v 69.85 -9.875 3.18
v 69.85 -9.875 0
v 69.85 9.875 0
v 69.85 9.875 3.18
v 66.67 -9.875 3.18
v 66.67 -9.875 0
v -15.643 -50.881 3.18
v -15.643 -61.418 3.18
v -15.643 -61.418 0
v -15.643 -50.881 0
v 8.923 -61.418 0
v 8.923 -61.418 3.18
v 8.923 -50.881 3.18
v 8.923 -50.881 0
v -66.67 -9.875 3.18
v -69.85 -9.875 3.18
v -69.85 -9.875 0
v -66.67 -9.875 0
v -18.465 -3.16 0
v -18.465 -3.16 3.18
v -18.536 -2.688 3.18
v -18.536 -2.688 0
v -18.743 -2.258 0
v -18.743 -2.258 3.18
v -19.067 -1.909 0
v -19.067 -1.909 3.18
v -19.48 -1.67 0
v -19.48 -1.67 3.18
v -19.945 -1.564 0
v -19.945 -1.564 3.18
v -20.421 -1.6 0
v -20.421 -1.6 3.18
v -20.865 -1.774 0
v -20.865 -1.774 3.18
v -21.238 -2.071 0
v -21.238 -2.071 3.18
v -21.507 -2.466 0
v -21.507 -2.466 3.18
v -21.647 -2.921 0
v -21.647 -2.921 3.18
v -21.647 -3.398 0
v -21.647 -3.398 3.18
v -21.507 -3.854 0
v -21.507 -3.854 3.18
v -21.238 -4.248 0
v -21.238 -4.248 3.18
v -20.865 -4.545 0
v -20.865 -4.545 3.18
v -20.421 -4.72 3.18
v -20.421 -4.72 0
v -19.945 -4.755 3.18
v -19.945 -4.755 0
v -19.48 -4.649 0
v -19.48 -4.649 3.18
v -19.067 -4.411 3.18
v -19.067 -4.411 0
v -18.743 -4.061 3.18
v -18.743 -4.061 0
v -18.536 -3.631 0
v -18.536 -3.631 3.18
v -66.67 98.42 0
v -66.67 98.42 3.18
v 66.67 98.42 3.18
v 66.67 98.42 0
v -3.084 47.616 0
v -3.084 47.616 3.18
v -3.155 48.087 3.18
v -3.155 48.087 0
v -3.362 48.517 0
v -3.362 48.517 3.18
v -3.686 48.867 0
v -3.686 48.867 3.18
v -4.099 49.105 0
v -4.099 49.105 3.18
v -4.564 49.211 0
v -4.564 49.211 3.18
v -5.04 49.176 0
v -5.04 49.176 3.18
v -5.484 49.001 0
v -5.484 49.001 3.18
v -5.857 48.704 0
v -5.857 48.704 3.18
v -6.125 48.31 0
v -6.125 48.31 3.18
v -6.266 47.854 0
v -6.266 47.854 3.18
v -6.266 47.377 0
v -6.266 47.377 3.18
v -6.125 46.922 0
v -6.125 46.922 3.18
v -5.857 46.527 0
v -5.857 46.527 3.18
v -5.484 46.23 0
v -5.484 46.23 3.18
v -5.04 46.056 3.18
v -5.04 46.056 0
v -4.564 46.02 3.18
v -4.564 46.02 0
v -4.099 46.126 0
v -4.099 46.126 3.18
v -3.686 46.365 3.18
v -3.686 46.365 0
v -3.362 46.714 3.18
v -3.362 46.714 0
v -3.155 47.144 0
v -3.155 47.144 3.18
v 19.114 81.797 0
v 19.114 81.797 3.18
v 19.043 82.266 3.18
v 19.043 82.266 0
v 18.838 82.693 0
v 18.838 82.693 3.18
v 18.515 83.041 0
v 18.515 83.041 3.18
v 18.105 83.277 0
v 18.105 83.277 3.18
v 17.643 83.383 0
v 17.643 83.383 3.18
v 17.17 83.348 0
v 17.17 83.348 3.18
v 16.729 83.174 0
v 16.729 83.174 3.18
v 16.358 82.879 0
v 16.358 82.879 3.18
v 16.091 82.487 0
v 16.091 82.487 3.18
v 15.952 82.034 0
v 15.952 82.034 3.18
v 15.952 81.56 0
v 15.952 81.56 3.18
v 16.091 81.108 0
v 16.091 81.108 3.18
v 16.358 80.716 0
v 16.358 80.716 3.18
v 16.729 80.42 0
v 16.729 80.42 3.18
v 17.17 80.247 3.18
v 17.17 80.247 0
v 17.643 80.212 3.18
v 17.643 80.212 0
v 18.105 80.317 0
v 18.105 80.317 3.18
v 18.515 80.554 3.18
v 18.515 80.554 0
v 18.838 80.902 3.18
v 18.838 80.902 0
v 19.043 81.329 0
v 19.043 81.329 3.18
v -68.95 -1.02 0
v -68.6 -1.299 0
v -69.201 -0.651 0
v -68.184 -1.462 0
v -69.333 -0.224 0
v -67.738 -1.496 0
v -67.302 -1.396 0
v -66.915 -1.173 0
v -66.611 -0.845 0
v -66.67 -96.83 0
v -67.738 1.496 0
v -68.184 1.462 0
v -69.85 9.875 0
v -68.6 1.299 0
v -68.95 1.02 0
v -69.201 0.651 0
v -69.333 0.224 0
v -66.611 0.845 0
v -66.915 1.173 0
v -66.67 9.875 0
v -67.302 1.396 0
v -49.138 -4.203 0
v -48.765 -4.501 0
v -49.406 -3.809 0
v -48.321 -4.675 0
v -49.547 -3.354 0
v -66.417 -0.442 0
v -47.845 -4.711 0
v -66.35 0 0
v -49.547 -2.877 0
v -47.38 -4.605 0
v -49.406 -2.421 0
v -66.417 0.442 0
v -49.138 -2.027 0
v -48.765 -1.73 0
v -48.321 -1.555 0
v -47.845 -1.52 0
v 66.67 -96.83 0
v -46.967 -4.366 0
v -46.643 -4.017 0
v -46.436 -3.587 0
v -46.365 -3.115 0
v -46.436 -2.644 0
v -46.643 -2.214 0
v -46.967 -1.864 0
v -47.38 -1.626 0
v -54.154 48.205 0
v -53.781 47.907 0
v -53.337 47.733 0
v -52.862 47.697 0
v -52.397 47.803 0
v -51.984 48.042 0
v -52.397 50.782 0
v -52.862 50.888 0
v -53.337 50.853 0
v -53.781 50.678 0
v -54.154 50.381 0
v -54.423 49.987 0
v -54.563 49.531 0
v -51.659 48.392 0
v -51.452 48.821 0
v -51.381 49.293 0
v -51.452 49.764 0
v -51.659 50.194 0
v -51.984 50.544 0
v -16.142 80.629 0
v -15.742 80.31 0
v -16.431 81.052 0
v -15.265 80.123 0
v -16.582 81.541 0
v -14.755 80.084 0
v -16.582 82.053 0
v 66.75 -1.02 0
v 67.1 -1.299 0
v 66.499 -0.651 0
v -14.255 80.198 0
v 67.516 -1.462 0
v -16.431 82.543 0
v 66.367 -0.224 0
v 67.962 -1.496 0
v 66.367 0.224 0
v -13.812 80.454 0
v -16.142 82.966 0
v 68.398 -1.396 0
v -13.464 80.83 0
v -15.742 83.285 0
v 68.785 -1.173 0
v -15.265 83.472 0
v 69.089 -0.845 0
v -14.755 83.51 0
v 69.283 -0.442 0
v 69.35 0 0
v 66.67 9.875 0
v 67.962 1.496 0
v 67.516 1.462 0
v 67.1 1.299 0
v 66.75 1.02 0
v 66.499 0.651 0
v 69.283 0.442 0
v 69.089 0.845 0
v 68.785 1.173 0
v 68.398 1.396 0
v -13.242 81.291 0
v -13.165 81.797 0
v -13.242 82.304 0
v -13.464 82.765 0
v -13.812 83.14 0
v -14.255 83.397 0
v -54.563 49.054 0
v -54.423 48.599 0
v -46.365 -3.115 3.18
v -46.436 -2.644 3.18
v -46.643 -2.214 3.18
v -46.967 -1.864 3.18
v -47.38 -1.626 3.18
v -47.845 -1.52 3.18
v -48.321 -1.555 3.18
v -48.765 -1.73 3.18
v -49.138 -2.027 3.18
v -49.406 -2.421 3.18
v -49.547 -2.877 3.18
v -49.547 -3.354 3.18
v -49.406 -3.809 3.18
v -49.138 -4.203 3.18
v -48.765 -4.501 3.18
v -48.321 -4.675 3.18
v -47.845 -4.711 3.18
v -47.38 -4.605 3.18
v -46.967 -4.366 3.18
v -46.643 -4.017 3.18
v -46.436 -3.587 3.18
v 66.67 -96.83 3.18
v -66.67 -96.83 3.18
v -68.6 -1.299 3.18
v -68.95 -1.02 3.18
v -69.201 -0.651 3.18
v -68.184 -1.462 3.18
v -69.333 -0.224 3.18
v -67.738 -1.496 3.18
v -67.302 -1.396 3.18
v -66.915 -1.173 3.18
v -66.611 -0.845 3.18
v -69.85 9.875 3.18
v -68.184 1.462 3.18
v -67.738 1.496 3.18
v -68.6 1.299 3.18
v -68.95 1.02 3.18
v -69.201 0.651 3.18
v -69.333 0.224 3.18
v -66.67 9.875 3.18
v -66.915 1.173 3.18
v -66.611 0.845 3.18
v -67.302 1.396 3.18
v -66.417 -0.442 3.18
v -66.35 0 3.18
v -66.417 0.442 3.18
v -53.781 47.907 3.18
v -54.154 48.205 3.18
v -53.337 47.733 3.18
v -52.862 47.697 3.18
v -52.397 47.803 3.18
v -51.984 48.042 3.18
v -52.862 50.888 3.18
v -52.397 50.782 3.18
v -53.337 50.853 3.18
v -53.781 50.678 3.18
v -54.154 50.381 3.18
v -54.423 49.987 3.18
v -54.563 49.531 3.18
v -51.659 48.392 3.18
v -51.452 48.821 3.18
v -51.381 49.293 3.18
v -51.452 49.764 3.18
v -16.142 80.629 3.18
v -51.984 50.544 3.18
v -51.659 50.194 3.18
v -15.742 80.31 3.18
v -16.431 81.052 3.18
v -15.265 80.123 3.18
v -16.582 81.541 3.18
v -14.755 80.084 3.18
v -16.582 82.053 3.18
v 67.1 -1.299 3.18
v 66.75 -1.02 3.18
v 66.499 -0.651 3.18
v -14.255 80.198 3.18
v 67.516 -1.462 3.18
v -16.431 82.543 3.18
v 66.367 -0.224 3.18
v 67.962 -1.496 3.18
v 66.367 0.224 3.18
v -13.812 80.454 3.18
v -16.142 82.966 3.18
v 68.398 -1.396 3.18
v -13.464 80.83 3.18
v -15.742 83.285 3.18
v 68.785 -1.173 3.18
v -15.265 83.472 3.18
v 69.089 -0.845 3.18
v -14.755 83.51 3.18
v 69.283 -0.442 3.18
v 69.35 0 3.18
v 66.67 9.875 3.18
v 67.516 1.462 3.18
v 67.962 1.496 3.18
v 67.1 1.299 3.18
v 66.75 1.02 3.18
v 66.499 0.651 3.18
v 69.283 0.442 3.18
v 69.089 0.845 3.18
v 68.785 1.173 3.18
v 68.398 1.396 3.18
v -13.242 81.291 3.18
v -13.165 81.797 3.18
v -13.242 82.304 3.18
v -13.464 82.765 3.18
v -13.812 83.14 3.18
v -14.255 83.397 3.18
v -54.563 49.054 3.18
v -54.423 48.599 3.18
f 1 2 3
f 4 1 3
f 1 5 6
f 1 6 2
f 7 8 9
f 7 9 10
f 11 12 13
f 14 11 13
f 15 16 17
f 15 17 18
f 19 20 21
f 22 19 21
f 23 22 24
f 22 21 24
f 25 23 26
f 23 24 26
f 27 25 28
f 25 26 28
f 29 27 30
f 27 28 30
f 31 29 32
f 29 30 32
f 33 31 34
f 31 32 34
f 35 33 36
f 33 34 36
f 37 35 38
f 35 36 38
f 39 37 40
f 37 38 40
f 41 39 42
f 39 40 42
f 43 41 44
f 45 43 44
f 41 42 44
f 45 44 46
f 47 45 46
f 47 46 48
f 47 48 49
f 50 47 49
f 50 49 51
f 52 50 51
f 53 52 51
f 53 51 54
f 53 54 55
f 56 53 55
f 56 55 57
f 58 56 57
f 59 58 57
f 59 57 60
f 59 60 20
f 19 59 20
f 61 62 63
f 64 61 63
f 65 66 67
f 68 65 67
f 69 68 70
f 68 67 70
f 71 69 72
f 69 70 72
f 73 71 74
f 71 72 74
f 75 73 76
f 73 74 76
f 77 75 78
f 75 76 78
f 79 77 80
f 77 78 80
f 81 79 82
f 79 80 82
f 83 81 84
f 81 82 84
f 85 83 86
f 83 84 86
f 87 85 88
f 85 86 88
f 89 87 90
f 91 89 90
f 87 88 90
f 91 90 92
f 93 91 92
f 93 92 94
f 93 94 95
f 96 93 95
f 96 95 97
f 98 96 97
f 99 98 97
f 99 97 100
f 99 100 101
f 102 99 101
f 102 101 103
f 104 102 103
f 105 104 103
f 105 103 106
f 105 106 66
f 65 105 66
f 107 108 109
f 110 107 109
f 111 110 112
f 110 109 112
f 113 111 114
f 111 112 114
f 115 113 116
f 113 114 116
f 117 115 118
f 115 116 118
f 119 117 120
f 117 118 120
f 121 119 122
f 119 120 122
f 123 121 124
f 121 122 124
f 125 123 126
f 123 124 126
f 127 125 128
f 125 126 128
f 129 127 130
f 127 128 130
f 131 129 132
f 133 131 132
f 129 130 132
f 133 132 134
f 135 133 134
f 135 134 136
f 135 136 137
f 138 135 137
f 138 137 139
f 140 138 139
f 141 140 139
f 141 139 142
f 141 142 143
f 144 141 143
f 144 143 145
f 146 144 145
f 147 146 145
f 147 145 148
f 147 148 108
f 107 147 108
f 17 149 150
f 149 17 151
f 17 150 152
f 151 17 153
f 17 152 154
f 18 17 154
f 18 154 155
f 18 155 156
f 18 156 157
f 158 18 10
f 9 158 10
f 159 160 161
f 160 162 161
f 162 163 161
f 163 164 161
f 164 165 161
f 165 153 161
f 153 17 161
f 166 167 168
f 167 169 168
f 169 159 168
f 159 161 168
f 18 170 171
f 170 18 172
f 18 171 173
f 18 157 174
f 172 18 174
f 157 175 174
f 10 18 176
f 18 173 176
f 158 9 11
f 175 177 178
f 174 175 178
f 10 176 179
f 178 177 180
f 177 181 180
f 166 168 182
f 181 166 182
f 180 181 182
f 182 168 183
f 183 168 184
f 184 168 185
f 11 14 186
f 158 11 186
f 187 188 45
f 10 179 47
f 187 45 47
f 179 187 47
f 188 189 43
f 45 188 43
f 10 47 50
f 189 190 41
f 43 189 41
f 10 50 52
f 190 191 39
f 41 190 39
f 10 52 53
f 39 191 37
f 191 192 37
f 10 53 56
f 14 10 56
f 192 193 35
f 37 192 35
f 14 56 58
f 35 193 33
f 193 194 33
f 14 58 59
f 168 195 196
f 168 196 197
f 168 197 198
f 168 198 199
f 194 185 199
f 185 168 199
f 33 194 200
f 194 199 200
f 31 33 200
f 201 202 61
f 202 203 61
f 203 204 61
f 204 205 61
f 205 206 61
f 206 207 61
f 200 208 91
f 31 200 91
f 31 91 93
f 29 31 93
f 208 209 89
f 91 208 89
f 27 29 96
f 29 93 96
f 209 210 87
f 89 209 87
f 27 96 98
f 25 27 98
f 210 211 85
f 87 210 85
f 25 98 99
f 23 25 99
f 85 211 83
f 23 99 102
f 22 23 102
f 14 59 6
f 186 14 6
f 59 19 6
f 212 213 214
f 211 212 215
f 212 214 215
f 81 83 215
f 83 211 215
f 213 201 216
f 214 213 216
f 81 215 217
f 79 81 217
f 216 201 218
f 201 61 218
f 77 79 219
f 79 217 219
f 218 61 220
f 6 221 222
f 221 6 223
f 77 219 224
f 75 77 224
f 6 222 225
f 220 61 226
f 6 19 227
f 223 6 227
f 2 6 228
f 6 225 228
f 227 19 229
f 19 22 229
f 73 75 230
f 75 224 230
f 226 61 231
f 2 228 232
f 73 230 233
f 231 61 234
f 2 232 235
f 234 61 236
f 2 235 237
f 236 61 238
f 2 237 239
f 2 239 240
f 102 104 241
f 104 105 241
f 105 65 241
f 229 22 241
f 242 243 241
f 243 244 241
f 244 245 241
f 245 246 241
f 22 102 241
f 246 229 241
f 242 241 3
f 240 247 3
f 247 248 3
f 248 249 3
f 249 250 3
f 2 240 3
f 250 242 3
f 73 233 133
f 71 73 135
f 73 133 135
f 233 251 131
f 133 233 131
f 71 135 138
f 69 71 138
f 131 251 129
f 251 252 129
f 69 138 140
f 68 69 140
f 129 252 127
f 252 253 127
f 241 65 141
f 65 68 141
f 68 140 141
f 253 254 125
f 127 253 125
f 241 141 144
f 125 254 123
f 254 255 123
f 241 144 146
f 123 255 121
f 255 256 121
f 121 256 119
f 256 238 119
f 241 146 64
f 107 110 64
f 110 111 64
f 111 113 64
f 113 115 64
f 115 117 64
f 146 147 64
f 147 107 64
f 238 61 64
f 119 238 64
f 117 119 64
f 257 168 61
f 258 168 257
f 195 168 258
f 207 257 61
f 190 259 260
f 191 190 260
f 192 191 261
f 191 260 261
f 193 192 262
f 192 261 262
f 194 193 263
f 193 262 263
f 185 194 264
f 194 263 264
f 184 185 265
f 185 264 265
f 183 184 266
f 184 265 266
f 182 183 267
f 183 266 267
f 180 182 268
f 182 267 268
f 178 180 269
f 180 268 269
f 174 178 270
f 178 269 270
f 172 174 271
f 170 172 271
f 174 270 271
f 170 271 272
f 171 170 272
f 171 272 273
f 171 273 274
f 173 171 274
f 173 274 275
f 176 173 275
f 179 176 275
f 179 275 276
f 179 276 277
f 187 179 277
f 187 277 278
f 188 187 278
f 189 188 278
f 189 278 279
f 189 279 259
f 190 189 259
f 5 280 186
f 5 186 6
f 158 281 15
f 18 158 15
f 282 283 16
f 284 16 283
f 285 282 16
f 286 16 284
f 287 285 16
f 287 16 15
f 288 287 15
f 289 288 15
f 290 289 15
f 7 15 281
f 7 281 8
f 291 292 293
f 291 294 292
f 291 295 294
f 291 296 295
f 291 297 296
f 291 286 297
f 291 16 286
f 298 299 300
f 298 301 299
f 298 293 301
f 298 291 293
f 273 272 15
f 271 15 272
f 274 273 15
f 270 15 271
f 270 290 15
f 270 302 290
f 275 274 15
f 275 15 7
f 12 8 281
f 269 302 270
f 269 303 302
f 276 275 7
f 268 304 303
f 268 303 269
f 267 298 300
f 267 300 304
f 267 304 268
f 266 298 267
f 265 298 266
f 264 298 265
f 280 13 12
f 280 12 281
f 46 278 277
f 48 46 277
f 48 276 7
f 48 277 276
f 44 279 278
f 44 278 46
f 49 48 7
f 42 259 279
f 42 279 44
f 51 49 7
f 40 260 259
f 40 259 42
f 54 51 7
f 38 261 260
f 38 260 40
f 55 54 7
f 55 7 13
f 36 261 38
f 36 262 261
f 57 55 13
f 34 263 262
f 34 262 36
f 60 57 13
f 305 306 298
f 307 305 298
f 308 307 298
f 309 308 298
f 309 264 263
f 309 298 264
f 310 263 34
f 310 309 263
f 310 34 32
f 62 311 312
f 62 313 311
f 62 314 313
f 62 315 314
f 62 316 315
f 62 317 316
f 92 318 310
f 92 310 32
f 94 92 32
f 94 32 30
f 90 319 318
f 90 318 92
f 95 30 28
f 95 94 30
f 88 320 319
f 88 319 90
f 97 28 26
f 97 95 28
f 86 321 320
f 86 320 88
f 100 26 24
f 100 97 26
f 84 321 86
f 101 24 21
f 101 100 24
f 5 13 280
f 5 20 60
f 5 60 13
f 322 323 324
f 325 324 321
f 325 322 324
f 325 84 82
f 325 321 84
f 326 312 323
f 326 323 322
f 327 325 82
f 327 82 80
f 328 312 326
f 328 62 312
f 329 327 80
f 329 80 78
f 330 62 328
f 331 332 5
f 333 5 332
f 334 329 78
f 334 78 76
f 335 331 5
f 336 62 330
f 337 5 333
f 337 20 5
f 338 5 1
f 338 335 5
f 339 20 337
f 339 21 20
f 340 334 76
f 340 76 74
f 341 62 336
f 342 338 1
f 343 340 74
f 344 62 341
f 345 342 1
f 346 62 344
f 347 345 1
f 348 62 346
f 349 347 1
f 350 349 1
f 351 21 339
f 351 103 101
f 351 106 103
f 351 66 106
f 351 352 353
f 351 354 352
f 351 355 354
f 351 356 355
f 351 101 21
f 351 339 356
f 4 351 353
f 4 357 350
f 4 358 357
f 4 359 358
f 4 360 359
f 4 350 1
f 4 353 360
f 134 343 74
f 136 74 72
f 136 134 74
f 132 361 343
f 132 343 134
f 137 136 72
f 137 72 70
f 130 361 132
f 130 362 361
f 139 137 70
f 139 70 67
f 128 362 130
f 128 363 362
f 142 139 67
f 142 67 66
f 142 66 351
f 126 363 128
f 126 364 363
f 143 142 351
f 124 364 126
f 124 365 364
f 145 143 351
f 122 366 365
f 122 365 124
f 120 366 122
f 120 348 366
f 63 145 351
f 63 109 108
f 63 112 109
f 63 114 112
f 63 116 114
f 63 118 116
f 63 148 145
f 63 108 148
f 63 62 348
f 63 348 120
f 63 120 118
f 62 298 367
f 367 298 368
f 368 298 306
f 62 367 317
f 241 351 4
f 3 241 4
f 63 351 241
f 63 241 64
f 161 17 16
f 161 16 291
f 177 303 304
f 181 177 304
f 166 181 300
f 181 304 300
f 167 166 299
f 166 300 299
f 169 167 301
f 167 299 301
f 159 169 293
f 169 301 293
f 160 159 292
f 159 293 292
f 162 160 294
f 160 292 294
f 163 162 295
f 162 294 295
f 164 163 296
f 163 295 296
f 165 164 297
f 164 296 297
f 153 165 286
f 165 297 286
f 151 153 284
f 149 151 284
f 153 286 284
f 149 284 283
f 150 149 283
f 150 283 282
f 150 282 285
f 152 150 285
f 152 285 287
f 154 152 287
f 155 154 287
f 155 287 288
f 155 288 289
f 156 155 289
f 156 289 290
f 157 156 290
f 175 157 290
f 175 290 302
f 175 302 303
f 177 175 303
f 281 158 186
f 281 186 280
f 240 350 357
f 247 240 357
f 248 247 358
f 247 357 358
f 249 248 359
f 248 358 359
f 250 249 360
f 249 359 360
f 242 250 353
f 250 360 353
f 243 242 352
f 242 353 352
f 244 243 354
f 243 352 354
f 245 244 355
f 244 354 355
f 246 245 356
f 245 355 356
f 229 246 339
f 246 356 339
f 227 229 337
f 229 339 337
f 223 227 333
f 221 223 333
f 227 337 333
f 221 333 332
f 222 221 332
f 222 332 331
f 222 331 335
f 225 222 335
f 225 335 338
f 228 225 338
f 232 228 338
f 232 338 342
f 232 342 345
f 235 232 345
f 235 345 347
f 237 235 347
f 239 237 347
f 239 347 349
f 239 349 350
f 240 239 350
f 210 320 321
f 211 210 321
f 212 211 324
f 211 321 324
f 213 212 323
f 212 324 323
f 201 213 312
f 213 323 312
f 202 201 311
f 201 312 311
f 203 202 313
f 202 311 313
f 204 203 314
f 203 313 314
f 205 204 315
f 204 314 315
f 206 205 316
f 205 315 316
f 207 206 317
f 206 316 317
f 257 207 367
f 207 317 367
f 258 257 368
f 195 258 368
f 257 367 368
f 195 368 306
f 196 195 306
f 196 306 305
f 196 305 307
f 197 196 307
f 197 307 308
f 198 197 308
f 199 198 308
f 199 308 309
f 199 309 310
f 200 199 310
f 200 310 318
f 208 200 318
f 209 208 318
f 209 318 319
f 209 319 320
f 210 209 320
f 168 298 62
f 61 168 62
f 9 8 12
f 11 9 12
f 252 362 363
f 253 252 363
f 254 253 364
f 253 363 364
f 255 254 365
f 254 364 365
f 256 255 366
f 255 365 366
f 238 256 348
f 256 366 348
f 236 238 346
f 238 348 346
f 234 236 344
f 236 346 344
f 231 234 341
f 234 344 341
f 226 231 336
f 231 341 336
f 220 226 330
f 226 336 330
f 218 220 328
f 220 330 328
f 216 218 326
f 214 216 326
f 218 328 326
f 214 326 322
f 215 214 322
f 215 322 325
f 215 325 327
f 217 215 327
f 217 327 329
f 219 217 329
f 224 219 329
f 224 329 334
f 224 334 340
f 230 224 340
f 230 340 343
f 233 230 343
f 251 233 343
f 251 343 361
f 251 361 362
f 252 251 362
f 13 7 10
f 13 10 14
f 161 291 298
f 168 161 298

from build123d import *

# Parameters (mm, degrees)
SKETCH1_W           = 139.7
SKETCH1_H           = 200.02
BOSS_EXTRUDE1_DEPTH = 3.18
SKETCH2_R           = 1.5
SKETCH2_W           = 3.18
SKETCH2_H           = 90.135
CUT_EXTRUDE1_DEPTH  = 4.18
SKETCH5_W           = 88.895716174
SKETCH5_H           = 168.56277979
BOSS_EXTRUDE2_DEPTH = 3.18
SKETCH6_W           = 20
SKETCH6_H           = 200.02
BOSS_EXTRUDE3_DEPTH = 3.18
SKETCH7_W           = 56.795
SKETCH7_H           = 3.18
CUT_EXTRUDE4_DEPTH  = 4.18
SKETCH8_W           = 133.34
SKETCH8_H           = 1.59
CUT_EXTRUDE5_DEPTH  = 4.18
SKETCH9_R           = 1.6
CUT_EXTRUDE6_DEPTH  = 4.18
SKETCH10_W          = 24.565797096
SKETCH10_H          = 10.537213664
CUT_EXTRUDE7_DEPTH  = 3.18
SKETCH11_R          = 1.59
SKETCH11_R_2        = 1.71788268
CUT_EXTRUDE8_DEPTH  = 35
SKETCH12_W          = 3.18
SKETCH12_H          = 3.18
CUT_EXTRUDE9_DEPTH  = 80.725


with BuildPart() as part:
    # Sketch1 → Boss-Extrude1 (new body)
    with BuildSketch(Plane.XY):
        Rectangle(SKETCH1_W, SKETCH1_H)
    extrude(amount=BOSS_EXTRUDE1_DEPTH)

    # Sketch2 → Cut-Extrude1 (cut, through all)
    with BuildSketch(Plane.XY.offset(3.18)):
        with Locations((-67.85, 0)):
            Circle(SKETCH2_R)
        with Locations((67.85, 0)):
            Circle(SKETCH2_R)
        Polygon((-10, 100.01), (10, 100.01), (10, 96.83), (1.5, 96.83), (1.5, 92.83), (3.5, 92.83), (3.5, 89.83), (1.5, 89.83), (1.5, 86.83), (-1.5, 86.83), (-1.5, 89.83), (-3.5, 89.83), (-3.5, 92.83), (-1.5, 92.83), (-1.5, 96.83), (-10, 96.83), align=None)
        Polygon((-10, -100.01), (-10, -96.83), (-1.5, -96.83), (-1.5, -92.83), (-3.5, -92.83), (-3.5, -89.83), (-1.5, -89.83), (-1.5, -86.83), (1.5, -86.83), (1.5, -89.83), (3.5, -89.83), (3.5, -92.83), (1.5, -92.83), (1.5, -96.83), (10, -96.83), (10, -100.01), align=None)
        with Locations((-68.26, 54.9425)):
            Rectangle(SKETCH2_W, SKETCH2_H)
        with Locations((-68.26, -54.9425)):
            Rectangle(SKETCH2_W, SKETCH2_H)
        with Locations((68.26, -54.9425)):
            Rectangle(SKETCH2_W, SKETCH2_H)
        with Locations((68.26, 54.9425)):
            Rectangle(SKETCH2_W, SKETCH2_H)
    extrude(amount=-CUT_EXTRUDE1_DEPTH, mode=Mode.SUBTRACT)

    # Sketch5 → Boss-Extrude2 (add)
    with BuildSketch(Plane.XY.offset(3.18)):
        Rectangle(SKETCH5_W, SKETCH5_H)
    extrude(amount=-BOSS_EXTRUDE2_DEPTH)

    # Sketch6 → Boss-Extrude3 (add)
    with BuildSketch(Plane.XY.offset(3.18)):
        Rectangle(SKETCH6_W, SKETCH6_H)
    extrude(amount=-BOSS_EXTRUDE3_DEPTH)

    # Sketch7 → Cut-Extrude4 (cut, through all)
    with BuildSketch(Plane.XY.offset(3.18)):
        with Locations((-38.2725, -98.42)):
            Rectangle(SKETCH7_W, SKETCH7_H)
        with Locations((38.2725, -98.42)):
            Rectangle(SKETCH7_W, SKETCH7_H)
    extrude(amount=-CUT_EXTRUDE4_DEPTH, mode=Mode.SUBTRACT)

    # Sketch8 → Cut-Extrude5 (cut, through all)
    with BuildSketch(Plane.XY.offset(3.18)):
        with Locations((0, 99.215)):
            Rectangle(SKETCH8_W, SKETCH8_H)
    extrude(amount=-CUT_EXTRUDE5_DEPTH, mode=Mode.SUBTRACT)

    # Sketch9 → Cut-Extrude6 (cut, through all)
    with BuildSketch(Plane.XY.offset(3.18)):
        with Locations((-52.981261278, 49.292856132)):
            Circle(SKETCH9_R)
        with Locations((-4.68387739, 47.615742656)):
            Circle(SKETCH9_R)
        with Locations((-20.064964891, -3.1597647)):
            Circle(SKETCH9_R)
        with Locations((-47.964929331, -3.115219713)):
            Circle(SKETCH9_R)
    extrude(amount=-CUT_EXTRUDE6_DEPTH, mode=Mode.SUBTRACT)

    # Sketch10 → Cut-Extrude7 (cut)
    with BuildSketch(Plane.XY.offset(3.18)):
        with Locations((-3.359789788, -56.149532718)):
            Rectangle(SKETCH10_W, SKETCH10_H)
    extrude(amount=-CUT_EXTRUDE7_DEPTH, mode=Mode.SUBTRACT)

    # Sketch11 → Cut-Extrude8 (cut)
    with BuildSketch(Plane.XY.offset(3.18)):
        with Locations((17.523878239, 81.797398404)):
            Circle(SKETCH11_R)
        with Locations((-14.883091948, 81.797398404)):
            Circle(SKETCH11_R_2)
    extrude(amount=-CUT_EXTRUDE8_DEPTH, mode=Mode.SUBTRACT)

    # Sketch12 → Cut-Extrude9 (cut, through all)
    with BuildSketch(Plane.ZY.offset(9.875)):
        with Locations((1.59, -98.42)):
            Rectangle(SKETCH12_W, SKETCH12_H)
    extrude(amount=-CUT_EXTRUDE9_DEPTH, mode=Mode.SUBTRACT)


solid = part.part
